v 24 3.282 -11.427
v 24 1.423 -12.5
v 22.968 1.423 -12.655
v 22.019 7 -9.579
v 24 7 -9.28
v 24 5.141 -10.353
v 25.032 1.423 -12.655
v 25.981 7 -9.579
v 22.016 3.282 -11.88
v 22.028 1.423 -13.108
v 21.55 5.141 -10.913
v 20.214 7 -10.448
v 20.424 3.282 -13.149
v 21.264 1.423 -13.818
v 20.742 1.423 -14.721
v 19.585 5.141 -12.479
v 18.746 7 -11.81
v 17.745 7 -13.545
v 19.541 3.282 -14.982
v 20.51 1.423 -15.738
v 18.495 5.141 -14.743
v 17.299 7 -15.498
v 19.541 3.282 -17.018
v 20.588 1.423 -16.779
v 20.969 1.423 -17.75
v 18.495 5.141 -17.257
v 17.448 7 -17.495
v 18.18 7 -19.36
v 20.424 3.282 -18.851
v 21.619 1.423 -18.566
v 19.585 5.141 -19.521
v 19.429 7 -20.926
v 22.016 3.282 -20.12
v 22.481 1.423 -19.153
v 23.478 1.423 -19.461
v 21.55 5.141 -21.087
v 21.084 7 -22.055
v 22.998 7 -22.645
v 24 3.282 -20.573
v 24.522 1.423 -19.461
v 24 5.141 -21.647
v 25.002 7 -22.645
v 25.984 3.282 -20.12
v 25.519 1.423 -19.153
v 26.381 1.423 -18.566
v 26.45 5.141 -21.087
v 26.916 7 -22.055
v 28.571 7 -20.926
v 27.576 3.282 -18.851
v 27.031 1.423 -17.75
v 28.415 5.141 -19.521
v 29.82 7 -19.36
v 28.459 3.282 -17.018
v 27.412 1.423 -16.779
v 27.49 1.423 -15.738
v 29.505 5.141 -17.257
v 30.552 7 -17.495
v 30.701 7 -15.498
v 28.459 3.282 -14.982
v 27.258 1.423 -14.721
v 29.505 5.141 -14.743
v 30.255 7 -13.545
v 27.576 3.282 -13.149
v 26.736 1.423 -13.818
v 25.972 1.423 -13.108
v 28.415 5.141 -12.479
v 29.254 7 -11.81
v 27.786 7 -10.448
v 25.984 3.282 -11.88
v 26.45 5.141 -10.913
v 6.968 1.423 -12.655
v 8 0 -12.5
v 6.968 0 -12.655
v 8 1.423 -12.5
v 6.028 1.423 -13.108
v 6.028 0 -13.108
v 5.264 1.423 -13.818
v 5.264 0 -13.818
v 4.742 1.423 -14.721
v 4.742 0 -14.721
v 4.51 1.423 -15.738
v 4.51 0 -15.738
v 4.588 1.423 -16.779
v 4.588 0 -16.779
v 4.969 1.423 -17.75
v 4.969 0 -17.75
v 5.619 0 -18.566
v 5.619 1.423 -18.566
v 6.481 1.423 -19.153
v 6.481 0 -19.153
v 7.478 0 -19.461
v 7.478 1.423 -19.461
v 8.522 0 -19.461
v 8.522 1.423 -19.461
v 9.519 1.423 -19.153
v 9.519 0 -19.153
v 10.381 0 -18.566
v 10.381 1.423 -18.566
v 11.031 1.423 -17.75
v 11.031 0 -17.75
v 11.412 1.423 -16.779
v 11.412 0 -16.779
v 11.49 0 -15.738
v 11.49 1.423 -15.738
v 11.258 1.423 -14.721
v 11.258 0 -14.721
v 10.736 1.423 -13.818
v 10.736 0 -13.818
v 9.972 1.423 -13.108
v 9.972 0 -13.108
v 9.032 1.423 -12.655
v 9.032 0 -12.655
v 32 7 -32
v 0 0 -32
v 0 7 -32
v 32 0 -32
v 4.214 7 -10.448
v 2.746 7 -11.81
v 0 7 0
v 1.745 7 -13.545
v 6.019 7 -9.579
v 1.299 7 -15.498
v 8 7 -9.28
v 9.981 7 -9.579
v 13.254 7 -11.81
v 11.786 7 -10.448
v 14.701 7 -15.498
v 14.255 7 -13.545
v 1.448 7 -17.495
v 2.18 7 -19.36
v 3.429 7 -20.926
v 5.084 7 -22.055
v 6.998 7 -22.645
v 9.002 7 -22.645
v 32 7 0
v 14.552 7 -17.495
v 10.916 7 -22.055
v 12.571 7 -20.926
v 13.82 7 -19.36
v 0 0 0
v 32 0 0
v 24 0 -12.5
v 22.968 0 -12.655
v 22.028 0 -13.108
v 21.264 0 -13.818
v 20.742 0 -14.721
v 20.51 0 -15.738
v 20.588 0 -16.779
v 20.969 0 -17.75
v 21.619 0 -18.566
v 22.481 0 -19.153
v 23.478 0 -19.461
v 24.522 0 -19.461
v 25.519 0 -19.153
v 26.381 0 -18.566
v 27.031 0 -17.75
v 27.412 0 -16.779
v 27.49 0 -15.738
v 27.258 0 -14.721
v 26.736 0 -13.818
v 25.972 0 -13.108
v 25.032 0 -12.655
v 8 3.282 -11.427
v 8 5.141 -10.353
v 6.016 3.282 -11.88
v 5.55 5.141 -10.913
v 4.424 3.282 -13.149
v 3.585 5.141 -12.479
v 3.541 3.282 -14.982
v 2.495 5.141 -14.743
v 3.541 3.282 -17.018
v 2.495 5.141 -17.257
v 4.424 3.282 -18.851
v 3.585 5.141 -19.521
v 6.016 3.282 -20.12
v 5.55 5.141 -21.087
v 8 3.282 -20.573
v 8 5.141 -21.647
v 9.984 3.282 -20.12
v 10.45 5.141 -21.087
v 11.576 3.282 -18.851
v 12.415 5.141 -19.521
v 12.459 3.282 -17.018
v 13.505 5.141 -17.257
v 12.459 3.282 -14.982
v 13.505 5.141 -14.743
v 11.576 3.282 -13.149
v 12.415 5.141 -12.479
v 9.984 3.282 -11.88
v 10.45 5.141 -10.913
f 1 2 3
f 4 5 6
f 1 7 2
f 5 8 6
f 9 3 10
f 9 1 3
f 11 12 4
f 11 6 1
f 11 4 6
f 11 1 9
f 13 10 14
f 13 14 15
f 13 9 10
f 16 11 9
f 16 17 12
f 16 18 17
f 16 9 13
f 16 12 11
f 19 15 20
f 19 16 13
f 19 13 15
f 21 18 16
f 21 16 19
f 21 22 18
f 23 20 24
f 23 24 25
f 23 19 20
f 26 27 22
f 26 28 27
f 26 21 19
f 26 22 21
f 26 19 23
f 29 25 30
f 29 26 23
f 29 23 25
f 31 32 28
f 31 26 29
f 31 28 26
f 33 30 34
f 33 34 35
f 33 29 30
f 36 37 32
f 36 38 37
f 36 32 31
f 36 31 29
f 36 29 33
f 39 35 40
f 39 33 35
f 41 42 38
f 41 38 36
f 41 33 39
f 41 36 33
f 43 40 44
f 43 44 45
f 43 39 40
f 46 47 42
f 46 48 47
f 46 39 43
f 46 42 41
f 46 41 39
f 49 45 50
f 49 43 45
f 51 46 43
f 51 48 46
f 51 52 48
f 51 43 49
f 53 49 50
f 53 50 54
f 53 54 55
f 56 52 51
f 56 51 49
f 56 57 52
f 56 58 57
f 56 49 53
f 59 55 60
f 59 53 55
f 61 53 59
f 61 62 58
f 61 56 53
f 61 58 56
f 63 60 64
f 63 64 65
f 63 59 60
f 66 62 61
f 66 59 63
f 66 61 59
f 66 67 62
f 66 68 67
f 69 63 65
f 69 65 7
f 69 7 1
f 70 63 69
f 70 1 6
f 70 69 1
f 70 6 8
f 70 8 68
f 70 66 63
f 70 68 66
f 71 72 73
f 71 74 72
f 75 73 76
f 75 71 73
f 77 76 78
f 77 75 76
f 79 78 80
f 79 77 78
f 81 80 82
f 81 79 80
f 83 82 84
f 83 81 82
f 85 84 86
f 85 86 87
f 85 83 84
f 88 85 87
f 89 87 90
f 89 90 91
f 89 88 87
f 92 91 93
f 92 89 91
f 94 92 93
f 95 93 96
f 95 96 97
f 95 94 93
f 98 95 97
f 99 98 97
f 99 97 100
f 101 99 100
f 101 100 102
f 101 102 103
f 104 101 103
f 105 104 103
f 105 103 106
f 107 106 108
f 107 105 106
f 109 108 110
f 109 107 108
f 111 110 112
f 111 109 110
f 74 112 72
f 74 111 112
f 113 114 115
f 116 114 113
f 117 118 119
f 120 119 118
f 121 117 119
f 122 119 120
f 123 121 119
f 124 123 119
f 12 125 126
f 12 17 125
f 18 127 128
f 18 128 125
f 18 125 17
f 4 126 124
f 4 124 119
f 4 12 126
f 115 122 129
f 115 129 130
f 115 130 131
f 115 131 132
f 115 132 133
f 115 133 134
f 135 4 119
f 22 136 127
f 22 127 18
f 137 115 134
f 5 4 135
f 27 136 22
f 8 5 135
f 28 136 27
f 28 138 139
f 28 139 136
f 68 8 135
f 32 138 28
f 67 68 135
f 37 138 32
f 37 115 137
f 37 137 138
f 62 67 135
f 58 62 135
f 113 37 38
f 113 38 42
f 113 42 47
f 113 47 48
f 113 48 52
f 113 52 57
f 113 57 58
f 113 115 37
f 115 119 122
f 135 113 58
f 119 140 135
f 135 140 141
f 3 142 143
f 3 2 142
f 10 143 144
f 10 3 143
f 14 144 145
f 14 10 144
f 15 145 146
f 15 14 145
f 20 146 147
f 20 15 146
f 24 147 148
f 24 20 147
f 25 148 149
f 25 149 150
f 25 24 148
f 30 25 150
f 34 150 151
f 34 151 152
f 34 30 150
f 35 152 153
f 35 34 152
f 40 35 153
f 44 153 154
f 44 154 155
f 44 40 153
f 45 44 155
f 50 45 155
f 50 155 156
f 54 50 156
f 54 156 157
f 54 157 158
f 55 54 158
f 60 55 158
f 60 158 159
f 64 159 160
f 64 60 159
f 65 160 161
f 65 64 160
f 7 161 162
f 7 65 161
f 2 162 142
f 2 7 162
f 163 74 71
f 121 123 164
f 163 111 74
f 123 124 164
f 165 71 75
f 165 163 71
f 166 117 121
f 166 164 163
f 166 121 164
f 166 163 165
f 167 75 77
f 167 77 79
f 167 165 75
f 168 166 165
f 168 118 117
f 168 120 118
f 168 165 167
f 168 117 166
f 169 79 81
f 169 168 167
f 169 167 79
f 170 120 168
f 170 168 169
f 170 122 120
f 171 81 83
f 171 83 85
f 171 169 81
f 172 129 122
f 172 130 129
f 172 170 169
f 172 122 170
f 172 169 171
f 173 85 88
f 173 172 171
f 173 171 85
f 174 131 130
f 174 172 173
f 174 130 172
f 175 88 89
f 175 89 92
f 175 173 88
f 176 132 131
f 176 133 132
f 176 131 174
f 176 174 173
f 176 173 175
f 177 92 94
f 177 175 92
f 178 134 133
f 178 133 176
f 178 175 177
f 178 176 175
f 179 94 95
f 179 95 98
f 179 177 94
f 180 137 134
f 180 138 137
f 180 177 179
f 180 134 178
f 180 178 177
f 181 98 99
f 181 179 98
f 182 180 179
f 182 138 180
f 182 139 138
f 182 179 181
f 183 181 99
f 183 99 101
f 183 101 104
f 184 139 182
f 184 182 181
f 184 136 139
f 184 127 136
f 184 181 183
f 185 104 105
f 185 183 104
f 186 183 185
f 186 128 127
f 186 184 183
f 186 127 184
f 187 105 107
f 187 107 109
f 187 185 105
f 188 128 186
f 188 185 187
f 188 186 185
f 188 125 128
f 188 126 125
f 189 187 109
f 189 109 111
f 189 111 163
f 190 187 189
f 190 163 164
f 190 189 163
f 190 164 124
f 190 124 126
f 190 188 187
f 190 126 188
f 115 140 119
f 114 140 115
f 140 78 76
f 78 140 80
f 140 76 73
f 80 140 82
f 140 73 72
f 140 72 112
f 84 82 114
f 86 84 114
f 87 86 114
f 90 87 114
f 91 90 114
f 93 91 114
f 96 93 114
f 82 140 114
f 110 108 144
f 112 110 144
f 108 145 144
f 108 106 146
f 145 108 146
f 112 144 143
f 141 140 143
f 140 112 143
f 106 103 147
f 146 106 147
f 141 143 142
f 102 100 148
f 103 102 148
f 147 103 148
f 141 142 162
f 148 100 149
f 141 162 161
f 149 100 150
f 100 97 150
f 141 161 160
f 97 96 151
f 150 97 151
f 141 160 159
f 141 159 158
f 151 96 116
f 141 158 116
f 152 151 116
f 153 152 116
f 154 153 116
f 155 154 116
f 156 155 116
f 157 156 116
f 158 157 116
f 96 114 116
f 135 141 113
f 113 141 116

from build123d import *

# Parameters (mm, degrees)
SKETCH1_W                    = 32
SKETCH1_H                    = 32
BOSS_EXTRUDE1_DEPTH          = 7
CSK_FOR_M6_SFHCS1_AT_2_COUNT = 2
CSK_FOR_M6_SFHCS1_AT_2_PITCH = 16


with BuildPart() as part:
    # Sketch1 → Boss-Extrude1 (new body)
    with BuildSketch(Plane(origin=(0, 0, 0), x_dir=(1, 0, 0), z_dir=(0, 1, 0))):
        with Locations((16, 16)):
            Rectangle(SKETCH1_W, SKETCH1_H)
    extrude(amount=BOSS_EXTRUDE1_DEPTH)

    # Sketch4 → CSK for M6 SFHCS1 (revolve, cut)
    with BuildSketch(Plane(origin=(8, 7, -16), x_dir=(0, 0, 1), z_dir=(1, 0, 0))):
        Polygon((0, 0), (0, 7), (3.5, 7), (3.5, 5.5772036), (6.72, 0), align=None)
    csk_for_m6_sfhcs1 = revolve(axis=Axis((8, 13.35, -16), (0, -1, 0)), mode=Mode.SUBTRACT)

    # CSK for M6 SFHCS1 at 2: CSK for M6 SFHCS1 ×2
    with Locations(*[(i * CSK_FOR_M6_SFHCS1_AT_2_PITCH, 0, 0) for i in range(1, CSK_FOR_M6_SFHCS1_AT_2_COUNT)]):
        add(csk_for_m6_sfhcs1, mode=Mode.SUBTRACT)


solid = part.part
